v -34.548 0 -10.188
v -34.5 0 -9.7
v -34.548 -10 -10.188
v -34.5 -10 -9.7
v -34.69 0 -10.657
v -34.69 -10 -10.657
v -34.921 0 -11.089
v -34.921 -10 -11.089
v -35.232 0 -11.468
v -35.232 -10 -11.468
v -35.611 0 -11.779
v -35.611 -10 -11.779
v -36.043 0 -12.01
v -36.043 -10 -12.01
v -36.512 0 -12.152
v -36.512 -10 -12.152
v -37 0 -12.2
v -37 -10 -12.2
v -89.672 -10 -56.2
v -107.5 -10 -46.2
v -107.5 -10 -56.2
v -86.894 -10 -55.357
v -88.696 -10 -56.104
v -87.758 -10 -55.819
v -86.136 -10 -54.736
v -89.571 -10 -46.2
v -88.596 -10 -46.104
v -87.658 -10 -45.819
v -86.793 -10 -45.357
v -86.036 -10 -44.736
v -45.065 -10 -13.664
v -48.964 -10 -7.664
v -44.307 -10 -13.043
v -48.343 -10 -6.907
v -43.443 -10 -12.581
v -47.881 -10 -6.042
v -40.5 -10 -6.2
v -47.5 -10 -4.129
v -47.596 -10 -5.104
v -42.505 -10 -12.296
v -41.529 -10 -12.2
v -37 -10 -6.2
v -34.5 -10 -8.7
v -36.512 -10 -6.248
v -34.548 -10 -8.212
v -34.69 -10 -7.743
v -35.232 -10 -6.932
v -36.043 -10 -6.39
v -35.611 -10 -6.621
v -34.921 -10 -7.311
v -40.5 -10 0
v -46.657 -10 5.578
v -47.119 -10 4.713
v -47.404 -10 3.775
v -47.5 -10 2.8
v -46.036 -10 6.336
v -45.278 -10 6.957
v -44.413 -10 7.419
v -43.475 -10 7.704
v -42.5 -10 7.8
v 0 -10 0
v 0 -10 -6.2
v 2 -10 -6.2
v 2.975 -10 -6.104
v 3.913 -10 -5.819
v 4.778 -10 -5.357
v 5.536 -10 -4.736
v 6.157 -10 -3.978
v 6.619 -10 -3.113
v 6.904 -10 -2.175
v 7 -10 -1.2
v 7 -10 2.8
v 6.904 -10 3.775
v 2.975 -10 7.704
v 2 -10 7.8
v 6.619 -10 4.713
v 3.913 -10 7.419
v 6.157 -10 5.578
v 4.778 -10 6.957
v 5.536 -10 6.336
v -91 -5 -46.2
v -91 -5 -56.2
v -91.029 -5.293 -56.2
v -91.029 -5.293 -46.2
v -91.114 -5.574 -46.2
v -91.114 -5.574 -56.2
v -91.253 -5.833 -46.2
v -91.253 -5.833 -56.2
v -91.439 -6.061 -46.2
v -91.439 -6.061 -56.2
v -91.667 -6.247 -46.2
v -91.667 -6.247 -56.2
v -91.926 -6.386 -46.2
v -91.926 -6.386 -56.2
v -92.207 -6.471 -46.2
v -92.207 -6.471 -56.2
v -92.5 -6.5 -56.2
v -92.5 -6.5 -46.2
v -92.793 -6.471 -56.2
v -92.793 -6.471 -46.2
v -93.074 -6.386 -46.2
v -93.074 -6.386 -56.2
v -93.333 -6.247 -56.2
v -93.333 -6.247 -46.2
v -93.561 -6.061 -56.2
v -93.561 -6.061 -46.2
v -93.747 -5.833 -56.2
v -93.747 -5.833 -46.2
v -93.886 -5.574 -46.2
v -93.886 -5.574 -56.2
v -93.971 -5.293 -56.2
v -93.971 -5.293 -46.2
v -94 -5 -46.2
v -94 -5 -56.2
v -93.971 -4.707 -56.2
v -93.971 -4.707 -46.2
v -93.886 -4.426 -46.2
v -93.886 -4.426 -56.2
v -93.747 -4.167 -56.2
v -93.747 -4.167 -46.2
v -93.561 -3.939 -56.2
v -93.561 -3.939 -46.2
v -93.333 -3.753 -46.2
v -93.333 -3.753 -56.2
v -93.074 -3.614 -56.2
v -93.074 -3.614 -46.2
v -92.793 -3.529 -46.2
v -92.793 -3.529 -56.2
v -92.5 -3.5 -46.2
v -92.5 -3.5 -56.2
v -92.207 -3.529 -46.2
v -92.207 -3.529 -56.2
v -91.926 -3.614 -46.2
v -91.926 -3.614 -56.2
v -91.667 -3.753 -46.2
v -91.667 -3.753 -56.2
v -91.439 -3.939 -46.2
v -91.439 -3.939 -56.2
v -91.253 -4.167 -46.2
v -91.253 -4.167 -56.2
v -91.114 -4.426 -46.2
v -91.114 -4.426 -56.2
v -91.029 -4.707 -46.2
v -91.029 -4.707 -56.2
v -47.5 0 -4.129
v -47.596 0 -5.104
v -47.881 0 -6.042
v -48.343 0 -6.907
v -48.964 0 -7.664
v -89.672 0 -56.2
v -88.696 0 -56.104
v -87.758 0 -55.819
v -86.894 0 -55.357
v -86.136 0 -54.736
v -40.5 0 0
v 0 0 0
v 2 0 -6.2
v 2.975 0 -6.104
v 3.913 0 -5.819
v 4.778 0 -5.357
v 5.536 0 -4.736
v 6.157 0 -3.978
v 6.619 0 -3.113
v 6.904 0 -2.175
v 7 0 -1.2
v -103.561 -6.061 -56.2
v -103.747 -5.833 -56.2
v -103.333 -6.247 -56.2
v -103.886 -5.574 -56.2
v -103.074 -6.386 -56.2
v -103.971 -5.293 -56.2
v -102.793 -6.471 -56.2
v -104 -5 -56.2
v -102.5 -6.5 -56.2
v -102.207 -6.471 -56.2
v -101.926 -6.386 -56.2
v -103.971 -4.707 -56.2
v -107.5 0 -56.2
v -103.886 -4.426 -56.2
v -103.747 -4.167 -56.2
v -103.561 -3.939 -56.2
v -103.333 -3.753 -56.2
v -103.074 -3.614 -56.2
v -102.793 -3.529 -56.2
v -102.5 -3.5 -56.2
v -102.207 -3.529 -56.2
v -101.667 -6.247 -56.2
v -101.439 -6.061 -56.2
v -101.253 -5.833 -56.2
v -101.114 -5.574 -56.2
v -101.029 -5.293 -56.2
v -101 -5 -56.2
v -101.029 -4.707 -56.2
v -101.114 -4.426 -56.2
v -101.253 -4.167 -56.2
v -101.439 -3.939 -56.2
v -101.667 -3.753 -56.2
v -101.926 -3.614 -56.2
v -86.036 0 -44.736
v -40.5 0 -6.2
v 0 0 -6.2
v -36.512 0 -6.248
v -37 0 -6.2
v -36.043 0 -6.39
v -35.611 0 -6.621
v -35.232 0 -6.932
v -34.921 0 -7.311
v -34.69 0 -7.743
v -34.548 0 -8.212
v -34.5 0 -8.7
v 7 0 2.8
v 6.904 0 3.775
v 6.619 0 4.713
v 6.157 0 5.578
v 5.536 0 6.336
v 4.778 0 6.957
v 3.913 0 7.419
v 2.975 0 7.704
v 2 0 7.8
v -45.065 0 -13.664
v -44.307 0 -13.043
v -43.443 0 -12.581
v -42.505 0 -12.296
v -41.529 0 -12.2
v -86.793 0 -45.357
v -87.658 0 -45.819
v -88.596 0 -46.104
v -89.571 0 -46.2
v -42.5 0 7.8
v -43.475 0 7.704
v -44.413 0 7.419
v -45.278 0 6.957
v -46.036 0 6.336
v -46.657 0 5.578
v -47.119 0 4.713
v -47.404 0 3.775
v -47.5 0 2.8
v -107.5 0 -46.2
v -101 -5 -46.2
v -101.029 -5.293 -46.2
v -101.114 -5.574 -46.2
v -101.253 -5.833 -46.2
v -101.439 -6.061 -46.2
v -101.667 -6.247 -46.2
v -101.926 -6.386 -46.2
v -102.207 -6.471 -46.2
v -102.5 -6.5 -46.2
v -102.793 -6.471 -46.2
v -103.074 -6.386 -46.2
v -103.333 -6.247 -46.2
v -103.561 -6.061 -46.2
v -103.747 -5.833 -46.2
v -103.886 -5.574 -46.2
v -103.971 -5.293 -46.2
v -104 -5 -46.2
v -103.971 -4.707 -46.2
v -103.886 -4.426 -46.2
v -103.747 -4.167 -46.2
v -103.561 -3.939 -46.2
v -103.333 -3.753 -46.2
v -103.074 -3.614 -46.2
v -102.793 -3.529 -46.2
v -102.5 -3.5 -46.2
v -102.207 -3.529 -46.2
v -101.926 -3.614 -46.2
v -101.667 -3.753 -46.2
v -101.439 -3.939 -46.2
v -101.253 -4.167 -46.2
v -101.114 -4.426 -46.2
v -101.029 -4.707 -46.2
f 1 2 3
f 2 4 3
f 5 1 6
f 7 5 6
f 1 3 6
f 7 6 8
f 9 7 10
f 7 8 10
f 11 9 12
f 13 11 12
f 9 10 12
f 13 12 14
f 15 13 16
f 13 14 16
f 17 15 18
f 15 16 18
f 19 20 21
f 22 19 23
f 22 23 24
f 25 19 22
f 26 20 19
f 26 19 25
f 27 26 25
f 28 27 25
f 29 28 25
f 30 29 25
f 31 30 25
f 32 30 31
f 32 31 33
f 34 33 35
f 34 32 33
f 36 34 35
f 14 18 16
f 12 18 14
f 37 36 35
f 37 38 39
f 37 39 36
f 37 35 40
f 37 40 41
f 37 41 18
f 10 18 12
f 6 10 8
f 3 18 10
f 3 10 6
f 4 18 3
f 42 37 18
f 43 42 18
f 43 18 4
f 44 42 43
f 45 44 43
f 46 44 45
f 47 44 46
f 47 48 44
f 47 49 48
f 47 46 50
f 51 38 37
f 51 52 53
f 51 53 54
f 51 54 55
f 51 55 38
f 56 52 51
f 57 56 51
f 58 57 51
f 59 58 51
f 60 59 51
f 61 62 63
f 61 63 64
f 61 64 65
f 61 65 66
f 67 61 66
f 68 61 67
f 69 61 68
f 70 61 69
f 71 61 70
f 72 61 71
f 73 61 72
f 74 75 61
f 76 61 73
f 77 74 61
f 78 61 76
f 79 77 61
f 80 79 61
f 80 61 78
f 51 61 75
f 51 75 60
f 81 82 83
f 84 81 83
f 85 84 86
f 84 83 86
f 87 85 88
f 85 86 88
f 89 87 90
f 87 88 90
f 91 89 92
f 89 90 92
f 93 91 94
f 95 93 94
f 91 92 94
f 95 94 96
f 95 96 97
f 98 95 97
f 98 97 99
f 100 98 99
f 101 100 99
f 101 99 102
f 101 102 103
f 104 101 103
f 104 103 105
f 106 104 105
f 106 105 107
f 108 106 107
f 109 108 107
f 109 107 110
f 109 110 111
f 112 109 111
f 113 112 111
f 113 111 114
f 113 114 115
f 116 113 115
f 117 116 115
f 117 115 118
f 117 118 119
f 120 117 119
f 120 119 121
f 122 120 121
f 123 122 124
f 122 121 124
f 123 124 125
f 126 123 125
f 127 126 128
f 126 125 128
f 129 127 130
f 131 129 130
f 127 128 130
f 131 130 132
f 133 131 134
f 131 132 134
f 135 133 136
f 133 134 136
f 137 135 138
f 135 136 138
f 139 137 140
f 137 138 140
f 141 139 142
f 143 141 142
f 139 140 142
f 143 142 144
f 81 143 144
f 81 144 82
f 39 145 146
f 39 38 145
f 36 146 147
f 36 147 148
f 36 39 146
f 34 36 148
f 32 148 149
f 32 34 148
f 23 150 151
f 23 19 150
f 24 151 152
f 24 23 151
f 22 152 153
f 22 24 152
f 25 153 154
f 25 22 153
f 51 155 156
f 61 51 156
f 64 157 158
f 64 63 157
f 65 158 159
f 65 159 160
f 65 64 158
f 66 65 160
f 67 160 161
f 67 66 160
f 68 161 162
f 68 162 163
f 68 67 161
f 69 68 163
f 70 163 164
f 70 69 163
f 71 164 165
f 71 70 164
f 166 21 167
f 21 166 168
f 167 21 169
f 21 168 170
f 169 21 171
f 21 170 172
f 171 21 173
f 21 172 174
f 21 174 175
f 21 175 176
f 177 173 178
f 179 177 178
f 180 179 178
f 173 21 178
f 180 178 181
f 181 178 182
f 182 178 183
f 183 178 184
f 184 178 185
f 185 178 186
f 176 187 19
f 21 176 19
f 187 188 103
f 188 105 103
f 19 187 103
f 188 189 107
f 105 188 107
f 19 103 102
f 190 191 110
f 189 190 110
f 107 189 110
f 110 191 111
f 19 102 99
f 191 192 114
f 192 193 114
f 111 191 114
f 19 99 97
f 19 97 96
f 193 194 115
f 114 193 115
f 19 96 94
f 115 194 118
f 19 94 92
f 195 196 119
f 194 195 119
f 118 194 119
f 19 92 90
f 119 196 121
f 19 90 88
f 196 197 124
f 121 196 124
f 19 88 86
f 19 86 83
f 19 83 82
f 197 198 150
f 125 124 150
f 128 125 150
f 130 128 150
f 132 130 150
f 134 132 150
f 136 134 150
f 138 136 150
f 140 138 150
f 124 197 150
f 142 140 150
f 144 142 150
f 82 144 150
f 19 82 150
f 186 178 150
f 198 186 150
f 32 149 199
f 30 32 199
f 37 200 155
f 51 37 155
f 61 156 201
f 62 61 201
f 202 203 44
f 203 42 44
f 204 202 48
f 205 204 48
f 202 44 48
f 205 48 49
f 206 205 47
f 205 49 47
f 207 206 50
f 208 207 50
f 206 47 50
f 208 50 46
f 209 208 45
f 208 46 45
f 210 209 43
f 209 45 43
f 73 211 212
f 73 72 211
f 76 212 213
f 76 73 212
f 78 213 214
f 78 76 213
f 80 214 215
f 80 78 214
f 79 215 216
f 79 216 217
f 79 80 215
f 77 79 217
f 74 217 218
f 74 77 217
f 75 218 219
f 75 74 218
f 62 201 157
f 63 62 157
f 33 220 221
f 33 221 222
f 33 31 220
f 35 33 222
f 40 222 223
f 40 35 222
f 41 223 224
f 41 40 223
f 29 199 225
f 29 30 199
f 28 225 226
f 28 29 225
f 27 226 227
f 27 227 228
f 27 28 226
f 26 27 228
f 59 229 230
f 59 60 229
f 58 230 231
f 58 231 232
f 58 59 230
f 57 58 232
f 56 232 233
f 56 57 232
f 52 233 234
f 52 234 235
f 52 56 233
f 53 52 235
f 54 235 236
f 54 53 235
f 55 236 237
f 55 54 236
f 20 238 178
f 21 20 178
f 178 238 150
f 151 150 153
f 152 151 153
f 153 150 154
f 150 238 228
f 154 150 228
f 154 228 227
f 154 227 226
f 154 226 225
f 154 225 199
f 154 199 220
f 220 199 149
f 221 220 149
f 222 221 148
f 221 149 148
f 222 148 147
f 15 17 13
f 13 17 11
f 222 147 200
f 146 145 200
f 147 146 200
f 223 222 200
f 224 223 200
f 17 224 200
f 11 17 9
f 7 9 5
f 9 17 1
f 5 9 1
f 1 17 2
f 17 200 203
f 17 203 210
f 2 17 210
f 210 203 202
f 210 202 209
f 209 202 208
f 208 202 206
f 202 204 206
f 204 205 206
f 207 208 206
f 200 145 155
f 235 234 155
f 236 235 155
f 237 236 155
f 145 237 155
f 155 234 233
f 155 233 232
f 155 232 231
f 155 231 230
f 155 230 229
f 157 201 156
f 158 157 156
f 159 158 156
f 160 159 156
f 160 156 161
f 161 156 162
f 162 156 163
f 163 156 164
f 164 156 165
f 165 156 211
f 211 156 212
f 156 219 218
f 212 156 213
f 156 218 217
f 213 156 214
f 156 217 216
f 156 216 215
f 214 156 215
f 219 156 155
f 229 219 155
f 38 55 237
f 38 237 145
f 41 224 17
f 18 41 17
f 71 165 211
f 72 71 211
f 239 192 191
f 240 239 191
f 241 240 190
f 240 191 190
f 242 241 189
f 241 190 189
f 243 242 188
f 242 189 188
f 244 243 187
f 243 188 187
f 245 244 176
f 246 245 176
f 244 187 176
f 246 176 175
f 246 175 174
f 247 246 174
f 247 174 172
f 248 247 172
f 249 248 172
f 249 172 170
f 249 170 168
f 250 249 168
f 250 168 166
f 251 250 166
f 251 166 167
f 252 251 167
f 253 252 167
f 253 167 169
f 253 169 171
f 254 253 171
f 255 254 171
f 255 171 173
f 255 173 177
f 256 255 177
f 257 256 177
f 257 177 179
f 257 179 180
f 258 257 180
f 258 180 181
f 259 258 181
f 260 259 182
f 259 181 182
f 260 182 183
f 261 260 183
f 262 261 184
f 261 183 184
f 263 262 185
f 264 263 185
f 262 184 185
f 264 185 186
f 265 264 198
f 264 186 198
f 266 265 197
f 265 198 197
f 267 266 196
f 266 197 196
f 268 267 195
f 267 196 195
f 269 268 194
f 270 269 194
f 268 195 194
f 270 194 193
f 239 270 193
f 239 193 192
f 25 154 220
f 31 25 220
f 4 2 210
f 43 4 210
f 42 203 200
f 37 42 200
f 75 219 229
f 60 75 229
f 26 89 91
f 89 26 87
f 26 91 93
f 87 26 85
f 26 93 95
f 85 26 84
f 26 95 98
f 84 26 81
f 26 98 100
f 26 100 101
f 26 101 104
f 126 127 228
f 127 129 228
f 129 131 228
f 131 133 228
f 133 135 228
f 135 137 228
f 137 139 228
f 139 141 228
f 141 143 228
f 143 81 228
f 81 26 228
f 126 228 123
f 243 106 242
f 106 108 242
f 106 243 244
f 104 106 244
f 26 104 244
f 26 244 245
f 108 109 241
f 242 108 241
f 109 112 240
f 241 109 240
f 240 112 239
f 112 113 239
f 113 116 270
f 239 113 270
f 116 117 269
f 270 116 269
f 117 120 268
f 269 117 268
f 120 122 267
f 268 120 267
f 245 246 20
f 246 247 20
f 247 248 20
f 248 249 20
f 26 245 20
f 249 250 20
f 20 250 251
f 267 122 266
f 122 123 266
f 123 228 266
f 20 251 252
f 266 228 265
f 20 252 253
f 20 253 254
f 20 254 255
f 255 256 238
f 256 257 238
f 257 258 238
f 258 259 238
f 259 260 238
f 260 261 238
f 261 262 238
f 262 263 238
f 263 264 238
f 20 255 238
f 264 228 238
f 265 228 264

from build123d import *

# Parameters (mm, degrees)
F1_DEPTH = 10
F2_R     = 5
F3_R     = 2.5
F5_R     = 1.5
F6_DEPTH = 25


# Not quite as in the source:
# - two fillets or chamfers of one size are made in one step
# - a feature names something its author has since deleted; it is built from what else it names


with BuildPart() as f1:
    # F0 (on Front) → F1 (new body)
    with BuildSketch(Plane.XZ):
        Polygon((-40.5, 0), (0, 0), (0, -6.2), (7, -6.2), (7, 7.8), (-47.5, 7.8), (-47.5, -6.2), (-87.5, -46.2), (-107.5, -46.2), (-107.5, -56.2), (-87.6005050634, -56.2), (-43.6005050634, -12.2), (-34.5, -12.2), (-34.5, -6.2), (-40.5, -6.2), align=None)
    extrude(amount=F1_DEPTH)

    # F2
    f2_edges = [f1.edges().sort_by_distance(p)[0] for p in [
        (7, -5, -6.2),
        (7, -5, 7.8),
        (-47.5, -5, 7.8),
        (-47.5, -5, -6.2),
        (-87.5, -5, -46.2),
        (-87.600505, -5, -56.2),
        (-43.600505, -5, -12.2),
    ]]
    fillet(f2_edges, radius=F2_R)

    # F3
    f3_edges = [f1.edges().sort_by_distance(p)[0] for p in [
        (-34.5, -5, -12.2),
        (-34.5, -5, -6.2),
    ]]
    fillet(f3_edges, radius=F3_R)

    # F5 (on face) → F6 (cut)
    with BuildSketch(Plane(origin=(0, 0, -56.2), x_dir=(1, 0, 0), z_dir=(0, 0, -1))):
        with Locations((-102.5, 5)):
            Circle(F5_R)
        with Locations((-92.5, 5)):
            Circle(F5_R)
    extrude(amount=-F6_DEPTH, mode=Mode.SUBTRACT)


solid = f1.part
